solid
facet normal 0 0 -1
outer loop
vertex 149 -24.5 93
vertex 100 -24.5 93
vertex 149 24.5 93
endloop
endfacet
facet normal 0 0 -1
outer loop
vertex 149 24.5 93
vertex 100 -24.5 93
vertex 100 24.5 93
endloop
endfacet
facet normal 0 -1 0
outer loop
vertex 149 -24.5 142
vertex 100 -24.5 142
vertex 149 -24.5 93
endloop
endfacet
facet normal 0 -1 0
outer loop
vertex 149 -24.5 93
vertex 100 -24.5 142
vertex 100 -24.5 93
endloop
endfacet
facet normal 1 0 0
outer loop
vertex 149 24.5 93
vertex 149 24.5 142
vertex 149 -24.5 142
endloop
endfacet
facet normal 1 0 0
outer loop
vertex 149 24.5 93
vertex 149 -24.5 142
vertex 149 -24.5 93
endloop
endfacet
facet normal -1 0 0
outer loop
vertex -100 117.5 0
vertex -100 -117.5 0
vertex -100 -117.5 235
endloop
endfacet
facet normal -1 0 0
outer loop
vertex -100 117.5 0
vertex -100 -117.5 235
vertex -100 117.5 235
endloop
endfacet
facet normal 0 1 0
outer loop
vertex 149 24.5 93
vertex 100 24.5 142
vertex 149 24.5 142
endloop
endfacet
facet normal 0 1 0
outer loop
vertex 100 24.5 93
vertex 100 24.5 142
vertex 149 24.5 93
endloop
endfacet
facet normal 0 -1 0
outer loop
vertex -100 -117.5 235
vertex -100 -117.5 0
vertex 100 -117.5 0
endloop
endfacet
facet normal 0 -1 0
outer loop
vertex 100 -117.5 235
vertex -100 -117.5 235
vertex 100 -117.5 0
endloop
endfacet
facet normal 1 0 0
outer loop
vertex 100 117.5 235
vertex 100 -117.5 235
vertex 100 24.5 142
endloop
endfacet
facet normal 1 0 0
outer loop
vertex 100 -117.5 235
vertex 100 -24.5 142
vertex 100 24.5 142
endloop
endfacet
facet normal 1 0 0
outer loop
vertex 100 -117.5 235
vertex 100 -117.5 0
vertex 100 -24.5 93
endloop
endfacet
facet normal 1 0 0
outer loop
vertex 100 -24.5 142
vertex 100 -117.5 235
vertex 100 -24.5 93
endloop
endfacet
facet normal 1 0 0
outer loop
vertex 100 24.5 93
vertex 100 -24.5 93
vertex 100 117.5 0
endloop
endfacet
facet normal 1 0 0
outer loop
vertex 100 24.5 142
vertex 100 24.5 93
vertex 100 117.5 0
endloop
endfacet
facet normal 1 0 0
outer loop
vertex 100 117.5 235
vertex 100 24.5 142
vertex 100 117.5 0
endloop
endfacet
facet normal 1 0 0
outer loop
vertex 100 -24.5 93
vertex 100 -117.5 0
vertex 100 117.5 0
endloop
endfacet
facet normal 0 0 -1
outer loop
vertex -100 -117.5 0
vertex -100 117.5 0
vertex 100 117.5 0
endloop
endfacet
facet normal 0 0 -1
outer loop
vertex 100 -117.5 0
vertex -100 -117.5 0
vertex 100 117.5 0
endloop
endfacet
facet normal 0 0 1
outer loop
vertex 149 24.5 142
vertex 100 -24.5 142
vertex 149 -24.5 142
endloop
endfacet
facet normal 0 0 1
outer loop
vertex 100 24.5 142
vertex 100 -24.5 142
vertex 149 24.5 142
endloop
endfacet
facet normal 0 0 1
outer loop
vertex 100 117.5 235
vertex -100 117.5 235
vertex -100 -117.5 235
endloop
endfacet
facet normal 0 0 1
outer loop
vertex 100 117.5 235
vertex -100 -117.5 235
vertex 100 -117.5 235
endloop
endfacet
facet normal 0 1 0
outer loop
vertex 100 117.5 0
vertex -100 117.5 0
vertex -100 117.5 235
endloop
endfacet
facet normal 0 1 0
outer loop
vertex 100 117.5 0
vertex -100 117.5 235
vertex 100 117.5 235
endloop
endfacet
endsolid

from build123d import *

# Parameters (mm, degrees)
CROQUIS1_W              = 200
CROQUIS1_H              = 235
SALIENTE_EXTRUIR1_DEPTH = 235
CROQUIS2_W              = 49
CROQUIS2_H              = 49
SALIENTE_EXTRUIR2_DEPTH = 49


with BuildPart() as part:
    # Croquis1 → Saliente-Extruir1 (new body)
    with BuildSketch(Plane.XY):
        Rectangle(CROQUIS1_W, CROQUIS1_H)
    extrude(amount=SALIENTE_EXTRUIR1_DEPTH)

    # Croquis2 → Saliente-Extruir2 (add)
    with BuildSketch(Plane(origin=(100, 0, 0), x_dir=(0, 0, -1), z_dir=(1, 0, 0))):
        with Locations((-117.5, 0)):
            Rectangle(CROQUIS2_W, CROQUIS2_H)
    extrude(amount=SALIENTE_EXTRUIR2_DEPTH)


solid = part.part
